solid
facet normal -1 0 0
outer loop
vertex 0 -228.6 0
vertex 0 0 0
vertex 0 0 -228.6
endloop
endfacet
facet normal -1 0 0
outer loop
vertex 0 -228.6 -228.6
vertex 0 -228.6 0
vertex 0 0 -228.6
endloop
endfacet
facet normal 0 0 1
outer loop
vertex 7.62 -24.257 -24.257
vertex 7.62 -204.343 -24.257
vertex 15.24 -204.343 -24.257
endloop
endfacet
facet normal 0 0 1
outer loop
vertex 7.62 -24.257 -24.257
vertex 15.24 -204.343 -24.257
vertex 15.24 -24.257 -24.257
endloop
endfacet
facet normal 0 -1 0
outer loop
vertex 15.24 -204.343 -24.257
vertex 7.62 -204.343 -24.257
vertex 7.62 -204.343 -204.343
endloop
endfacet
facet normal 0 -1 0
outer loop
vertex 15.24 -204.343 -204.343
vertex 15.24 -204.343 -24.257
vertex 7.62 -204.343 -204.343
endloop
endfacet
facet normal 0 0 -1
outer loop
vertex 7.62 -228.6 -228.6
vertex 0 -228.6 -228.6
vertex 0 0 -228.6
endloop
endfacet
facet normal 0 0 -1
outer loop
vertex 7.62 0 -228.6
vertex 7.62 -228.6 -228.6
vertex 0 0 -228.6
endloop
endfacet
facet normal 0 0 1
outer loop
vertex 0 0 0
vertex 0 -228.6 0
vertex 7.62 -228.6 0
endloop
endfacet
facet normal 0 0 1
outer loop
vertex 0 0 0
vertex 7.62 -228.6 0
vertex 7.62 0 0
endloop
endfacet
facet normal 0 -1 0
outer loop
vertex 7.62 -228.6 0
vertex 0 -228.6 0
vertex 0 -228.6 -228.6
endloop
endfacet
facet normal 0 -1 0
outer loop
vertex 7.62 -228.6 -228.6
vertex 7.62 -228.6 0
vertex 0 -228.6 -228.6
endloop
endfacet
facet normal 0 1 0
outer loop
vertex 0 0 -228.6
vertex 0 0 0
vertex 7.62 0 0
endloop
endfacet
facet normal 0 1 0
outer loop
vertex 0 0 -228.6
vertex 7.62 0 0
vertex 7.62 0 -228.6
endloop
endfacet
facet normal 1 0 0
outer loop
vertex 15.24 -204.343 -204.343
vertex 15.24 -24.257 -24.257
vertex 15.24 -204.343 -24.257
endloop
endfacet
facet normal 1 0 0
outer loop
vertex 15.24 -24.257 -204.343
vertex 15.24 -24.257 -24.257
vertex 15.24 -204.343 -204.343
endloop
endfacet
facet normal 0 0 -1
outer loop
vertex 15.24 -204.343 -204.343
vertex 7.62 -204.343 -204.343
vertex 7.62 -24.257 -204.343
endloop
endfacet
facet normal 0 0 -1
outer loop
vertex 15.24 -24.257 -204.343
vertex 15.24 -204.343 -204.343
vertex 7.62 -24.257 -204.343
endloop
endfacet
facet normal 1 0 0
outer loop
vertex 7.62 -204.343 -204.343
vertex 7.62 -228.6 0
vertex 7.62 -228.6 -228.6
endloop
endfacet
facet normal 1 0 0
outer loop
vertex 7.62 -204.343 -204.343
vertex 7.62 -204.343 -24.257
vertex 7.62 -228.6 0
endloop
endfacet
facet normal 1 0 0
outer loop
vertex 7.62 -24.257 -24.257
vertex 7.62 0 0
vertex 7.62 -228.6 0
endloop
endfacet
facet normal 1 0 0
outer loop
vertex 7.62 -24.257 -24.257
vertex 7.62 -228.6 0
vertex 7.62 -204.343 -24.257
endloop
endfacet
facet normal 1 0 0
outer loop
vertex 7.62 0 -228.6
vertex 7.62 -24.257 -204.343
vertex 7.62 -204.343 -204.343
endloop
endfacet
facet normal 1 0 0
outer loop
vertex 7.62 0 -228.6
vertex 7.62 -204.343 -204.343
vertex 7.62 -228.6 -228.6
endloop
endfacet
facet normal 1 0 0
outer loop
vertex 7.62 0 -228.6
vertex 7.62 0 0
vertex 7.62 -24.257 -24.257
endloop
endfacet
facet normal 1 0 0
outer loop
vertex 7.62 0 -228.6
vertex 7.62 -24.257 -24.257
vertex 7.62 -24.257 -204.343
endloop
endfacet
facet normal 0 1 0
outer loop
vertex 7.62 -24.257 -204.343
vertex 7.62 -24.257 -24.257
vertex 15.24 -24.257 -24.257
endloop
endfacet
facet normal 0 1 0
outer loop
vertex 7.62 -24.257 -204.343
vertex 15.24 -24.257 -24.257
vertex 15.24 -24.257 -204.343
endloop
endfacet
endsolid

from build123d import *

# Parameters (mm, degrees)
SKETCH1_W           = 228.6
SKETCH1_H           = 228.6
SKETCH1_W_2         = 180.086
SKETCH1_H_2         = 180.086
BOSS_EXTRUDE1_DEPTH = 7.62
BOSS_EXTRUDE2_START = 7.62
SKETCH1_3_W         = 180.086
SKETCH1_3_H         = 180.086
BOSS_EXTRUDE2_DEPTH = 7.62


with BuildPart() as part:
    # Sketch1 → Boss-Extrude1 (new body)
    # profile 1 of 2: a face of its own
    with BuildSketch(Plane(origin=(0, 0, 0), x_dir=(0, 0, -1), z_dir=(1, 0, 0))):
        with Locations((114.3, -114.3)):
            Rectangle(SKETCH1_W, SKETCH1_H)
        with Locations((114.3, -114.3)):
            Rectangle(SKETCH1_W_2, SKETCH1_H_2, mode=Mode.SUBTRACT)
    # profile 2 of 2: a face of its own
    with BuildSketch(Plane(origin=(0, 0, 0), x_dir=(0, 0, -1), z_dir=(1, 0, 0))):
        with Locations((114.3, -114.3)):
            Rectangle(SKETCH1_W_2, SKETCH1_H_2)
    extrude(amount=BOSS_EXTRUDE1_DEPTH)

    # Sketch1<3> → Boss-Extrude2 (add)
    with BuildSketch(Plane(origin=(0, 0, 0), x_dir=(0, 0, -1), z_dir=(1, 0, 0)).offset(BOSS_EXTRUDE2_START)):
        with Locations((114.3, -114.3)):
            Rectangle(SKETCH1_3_W, SKETCH1_3_H)
    extrude(amount=BOSS_EXTRUDE2_DEPTH)


solid = part.part
